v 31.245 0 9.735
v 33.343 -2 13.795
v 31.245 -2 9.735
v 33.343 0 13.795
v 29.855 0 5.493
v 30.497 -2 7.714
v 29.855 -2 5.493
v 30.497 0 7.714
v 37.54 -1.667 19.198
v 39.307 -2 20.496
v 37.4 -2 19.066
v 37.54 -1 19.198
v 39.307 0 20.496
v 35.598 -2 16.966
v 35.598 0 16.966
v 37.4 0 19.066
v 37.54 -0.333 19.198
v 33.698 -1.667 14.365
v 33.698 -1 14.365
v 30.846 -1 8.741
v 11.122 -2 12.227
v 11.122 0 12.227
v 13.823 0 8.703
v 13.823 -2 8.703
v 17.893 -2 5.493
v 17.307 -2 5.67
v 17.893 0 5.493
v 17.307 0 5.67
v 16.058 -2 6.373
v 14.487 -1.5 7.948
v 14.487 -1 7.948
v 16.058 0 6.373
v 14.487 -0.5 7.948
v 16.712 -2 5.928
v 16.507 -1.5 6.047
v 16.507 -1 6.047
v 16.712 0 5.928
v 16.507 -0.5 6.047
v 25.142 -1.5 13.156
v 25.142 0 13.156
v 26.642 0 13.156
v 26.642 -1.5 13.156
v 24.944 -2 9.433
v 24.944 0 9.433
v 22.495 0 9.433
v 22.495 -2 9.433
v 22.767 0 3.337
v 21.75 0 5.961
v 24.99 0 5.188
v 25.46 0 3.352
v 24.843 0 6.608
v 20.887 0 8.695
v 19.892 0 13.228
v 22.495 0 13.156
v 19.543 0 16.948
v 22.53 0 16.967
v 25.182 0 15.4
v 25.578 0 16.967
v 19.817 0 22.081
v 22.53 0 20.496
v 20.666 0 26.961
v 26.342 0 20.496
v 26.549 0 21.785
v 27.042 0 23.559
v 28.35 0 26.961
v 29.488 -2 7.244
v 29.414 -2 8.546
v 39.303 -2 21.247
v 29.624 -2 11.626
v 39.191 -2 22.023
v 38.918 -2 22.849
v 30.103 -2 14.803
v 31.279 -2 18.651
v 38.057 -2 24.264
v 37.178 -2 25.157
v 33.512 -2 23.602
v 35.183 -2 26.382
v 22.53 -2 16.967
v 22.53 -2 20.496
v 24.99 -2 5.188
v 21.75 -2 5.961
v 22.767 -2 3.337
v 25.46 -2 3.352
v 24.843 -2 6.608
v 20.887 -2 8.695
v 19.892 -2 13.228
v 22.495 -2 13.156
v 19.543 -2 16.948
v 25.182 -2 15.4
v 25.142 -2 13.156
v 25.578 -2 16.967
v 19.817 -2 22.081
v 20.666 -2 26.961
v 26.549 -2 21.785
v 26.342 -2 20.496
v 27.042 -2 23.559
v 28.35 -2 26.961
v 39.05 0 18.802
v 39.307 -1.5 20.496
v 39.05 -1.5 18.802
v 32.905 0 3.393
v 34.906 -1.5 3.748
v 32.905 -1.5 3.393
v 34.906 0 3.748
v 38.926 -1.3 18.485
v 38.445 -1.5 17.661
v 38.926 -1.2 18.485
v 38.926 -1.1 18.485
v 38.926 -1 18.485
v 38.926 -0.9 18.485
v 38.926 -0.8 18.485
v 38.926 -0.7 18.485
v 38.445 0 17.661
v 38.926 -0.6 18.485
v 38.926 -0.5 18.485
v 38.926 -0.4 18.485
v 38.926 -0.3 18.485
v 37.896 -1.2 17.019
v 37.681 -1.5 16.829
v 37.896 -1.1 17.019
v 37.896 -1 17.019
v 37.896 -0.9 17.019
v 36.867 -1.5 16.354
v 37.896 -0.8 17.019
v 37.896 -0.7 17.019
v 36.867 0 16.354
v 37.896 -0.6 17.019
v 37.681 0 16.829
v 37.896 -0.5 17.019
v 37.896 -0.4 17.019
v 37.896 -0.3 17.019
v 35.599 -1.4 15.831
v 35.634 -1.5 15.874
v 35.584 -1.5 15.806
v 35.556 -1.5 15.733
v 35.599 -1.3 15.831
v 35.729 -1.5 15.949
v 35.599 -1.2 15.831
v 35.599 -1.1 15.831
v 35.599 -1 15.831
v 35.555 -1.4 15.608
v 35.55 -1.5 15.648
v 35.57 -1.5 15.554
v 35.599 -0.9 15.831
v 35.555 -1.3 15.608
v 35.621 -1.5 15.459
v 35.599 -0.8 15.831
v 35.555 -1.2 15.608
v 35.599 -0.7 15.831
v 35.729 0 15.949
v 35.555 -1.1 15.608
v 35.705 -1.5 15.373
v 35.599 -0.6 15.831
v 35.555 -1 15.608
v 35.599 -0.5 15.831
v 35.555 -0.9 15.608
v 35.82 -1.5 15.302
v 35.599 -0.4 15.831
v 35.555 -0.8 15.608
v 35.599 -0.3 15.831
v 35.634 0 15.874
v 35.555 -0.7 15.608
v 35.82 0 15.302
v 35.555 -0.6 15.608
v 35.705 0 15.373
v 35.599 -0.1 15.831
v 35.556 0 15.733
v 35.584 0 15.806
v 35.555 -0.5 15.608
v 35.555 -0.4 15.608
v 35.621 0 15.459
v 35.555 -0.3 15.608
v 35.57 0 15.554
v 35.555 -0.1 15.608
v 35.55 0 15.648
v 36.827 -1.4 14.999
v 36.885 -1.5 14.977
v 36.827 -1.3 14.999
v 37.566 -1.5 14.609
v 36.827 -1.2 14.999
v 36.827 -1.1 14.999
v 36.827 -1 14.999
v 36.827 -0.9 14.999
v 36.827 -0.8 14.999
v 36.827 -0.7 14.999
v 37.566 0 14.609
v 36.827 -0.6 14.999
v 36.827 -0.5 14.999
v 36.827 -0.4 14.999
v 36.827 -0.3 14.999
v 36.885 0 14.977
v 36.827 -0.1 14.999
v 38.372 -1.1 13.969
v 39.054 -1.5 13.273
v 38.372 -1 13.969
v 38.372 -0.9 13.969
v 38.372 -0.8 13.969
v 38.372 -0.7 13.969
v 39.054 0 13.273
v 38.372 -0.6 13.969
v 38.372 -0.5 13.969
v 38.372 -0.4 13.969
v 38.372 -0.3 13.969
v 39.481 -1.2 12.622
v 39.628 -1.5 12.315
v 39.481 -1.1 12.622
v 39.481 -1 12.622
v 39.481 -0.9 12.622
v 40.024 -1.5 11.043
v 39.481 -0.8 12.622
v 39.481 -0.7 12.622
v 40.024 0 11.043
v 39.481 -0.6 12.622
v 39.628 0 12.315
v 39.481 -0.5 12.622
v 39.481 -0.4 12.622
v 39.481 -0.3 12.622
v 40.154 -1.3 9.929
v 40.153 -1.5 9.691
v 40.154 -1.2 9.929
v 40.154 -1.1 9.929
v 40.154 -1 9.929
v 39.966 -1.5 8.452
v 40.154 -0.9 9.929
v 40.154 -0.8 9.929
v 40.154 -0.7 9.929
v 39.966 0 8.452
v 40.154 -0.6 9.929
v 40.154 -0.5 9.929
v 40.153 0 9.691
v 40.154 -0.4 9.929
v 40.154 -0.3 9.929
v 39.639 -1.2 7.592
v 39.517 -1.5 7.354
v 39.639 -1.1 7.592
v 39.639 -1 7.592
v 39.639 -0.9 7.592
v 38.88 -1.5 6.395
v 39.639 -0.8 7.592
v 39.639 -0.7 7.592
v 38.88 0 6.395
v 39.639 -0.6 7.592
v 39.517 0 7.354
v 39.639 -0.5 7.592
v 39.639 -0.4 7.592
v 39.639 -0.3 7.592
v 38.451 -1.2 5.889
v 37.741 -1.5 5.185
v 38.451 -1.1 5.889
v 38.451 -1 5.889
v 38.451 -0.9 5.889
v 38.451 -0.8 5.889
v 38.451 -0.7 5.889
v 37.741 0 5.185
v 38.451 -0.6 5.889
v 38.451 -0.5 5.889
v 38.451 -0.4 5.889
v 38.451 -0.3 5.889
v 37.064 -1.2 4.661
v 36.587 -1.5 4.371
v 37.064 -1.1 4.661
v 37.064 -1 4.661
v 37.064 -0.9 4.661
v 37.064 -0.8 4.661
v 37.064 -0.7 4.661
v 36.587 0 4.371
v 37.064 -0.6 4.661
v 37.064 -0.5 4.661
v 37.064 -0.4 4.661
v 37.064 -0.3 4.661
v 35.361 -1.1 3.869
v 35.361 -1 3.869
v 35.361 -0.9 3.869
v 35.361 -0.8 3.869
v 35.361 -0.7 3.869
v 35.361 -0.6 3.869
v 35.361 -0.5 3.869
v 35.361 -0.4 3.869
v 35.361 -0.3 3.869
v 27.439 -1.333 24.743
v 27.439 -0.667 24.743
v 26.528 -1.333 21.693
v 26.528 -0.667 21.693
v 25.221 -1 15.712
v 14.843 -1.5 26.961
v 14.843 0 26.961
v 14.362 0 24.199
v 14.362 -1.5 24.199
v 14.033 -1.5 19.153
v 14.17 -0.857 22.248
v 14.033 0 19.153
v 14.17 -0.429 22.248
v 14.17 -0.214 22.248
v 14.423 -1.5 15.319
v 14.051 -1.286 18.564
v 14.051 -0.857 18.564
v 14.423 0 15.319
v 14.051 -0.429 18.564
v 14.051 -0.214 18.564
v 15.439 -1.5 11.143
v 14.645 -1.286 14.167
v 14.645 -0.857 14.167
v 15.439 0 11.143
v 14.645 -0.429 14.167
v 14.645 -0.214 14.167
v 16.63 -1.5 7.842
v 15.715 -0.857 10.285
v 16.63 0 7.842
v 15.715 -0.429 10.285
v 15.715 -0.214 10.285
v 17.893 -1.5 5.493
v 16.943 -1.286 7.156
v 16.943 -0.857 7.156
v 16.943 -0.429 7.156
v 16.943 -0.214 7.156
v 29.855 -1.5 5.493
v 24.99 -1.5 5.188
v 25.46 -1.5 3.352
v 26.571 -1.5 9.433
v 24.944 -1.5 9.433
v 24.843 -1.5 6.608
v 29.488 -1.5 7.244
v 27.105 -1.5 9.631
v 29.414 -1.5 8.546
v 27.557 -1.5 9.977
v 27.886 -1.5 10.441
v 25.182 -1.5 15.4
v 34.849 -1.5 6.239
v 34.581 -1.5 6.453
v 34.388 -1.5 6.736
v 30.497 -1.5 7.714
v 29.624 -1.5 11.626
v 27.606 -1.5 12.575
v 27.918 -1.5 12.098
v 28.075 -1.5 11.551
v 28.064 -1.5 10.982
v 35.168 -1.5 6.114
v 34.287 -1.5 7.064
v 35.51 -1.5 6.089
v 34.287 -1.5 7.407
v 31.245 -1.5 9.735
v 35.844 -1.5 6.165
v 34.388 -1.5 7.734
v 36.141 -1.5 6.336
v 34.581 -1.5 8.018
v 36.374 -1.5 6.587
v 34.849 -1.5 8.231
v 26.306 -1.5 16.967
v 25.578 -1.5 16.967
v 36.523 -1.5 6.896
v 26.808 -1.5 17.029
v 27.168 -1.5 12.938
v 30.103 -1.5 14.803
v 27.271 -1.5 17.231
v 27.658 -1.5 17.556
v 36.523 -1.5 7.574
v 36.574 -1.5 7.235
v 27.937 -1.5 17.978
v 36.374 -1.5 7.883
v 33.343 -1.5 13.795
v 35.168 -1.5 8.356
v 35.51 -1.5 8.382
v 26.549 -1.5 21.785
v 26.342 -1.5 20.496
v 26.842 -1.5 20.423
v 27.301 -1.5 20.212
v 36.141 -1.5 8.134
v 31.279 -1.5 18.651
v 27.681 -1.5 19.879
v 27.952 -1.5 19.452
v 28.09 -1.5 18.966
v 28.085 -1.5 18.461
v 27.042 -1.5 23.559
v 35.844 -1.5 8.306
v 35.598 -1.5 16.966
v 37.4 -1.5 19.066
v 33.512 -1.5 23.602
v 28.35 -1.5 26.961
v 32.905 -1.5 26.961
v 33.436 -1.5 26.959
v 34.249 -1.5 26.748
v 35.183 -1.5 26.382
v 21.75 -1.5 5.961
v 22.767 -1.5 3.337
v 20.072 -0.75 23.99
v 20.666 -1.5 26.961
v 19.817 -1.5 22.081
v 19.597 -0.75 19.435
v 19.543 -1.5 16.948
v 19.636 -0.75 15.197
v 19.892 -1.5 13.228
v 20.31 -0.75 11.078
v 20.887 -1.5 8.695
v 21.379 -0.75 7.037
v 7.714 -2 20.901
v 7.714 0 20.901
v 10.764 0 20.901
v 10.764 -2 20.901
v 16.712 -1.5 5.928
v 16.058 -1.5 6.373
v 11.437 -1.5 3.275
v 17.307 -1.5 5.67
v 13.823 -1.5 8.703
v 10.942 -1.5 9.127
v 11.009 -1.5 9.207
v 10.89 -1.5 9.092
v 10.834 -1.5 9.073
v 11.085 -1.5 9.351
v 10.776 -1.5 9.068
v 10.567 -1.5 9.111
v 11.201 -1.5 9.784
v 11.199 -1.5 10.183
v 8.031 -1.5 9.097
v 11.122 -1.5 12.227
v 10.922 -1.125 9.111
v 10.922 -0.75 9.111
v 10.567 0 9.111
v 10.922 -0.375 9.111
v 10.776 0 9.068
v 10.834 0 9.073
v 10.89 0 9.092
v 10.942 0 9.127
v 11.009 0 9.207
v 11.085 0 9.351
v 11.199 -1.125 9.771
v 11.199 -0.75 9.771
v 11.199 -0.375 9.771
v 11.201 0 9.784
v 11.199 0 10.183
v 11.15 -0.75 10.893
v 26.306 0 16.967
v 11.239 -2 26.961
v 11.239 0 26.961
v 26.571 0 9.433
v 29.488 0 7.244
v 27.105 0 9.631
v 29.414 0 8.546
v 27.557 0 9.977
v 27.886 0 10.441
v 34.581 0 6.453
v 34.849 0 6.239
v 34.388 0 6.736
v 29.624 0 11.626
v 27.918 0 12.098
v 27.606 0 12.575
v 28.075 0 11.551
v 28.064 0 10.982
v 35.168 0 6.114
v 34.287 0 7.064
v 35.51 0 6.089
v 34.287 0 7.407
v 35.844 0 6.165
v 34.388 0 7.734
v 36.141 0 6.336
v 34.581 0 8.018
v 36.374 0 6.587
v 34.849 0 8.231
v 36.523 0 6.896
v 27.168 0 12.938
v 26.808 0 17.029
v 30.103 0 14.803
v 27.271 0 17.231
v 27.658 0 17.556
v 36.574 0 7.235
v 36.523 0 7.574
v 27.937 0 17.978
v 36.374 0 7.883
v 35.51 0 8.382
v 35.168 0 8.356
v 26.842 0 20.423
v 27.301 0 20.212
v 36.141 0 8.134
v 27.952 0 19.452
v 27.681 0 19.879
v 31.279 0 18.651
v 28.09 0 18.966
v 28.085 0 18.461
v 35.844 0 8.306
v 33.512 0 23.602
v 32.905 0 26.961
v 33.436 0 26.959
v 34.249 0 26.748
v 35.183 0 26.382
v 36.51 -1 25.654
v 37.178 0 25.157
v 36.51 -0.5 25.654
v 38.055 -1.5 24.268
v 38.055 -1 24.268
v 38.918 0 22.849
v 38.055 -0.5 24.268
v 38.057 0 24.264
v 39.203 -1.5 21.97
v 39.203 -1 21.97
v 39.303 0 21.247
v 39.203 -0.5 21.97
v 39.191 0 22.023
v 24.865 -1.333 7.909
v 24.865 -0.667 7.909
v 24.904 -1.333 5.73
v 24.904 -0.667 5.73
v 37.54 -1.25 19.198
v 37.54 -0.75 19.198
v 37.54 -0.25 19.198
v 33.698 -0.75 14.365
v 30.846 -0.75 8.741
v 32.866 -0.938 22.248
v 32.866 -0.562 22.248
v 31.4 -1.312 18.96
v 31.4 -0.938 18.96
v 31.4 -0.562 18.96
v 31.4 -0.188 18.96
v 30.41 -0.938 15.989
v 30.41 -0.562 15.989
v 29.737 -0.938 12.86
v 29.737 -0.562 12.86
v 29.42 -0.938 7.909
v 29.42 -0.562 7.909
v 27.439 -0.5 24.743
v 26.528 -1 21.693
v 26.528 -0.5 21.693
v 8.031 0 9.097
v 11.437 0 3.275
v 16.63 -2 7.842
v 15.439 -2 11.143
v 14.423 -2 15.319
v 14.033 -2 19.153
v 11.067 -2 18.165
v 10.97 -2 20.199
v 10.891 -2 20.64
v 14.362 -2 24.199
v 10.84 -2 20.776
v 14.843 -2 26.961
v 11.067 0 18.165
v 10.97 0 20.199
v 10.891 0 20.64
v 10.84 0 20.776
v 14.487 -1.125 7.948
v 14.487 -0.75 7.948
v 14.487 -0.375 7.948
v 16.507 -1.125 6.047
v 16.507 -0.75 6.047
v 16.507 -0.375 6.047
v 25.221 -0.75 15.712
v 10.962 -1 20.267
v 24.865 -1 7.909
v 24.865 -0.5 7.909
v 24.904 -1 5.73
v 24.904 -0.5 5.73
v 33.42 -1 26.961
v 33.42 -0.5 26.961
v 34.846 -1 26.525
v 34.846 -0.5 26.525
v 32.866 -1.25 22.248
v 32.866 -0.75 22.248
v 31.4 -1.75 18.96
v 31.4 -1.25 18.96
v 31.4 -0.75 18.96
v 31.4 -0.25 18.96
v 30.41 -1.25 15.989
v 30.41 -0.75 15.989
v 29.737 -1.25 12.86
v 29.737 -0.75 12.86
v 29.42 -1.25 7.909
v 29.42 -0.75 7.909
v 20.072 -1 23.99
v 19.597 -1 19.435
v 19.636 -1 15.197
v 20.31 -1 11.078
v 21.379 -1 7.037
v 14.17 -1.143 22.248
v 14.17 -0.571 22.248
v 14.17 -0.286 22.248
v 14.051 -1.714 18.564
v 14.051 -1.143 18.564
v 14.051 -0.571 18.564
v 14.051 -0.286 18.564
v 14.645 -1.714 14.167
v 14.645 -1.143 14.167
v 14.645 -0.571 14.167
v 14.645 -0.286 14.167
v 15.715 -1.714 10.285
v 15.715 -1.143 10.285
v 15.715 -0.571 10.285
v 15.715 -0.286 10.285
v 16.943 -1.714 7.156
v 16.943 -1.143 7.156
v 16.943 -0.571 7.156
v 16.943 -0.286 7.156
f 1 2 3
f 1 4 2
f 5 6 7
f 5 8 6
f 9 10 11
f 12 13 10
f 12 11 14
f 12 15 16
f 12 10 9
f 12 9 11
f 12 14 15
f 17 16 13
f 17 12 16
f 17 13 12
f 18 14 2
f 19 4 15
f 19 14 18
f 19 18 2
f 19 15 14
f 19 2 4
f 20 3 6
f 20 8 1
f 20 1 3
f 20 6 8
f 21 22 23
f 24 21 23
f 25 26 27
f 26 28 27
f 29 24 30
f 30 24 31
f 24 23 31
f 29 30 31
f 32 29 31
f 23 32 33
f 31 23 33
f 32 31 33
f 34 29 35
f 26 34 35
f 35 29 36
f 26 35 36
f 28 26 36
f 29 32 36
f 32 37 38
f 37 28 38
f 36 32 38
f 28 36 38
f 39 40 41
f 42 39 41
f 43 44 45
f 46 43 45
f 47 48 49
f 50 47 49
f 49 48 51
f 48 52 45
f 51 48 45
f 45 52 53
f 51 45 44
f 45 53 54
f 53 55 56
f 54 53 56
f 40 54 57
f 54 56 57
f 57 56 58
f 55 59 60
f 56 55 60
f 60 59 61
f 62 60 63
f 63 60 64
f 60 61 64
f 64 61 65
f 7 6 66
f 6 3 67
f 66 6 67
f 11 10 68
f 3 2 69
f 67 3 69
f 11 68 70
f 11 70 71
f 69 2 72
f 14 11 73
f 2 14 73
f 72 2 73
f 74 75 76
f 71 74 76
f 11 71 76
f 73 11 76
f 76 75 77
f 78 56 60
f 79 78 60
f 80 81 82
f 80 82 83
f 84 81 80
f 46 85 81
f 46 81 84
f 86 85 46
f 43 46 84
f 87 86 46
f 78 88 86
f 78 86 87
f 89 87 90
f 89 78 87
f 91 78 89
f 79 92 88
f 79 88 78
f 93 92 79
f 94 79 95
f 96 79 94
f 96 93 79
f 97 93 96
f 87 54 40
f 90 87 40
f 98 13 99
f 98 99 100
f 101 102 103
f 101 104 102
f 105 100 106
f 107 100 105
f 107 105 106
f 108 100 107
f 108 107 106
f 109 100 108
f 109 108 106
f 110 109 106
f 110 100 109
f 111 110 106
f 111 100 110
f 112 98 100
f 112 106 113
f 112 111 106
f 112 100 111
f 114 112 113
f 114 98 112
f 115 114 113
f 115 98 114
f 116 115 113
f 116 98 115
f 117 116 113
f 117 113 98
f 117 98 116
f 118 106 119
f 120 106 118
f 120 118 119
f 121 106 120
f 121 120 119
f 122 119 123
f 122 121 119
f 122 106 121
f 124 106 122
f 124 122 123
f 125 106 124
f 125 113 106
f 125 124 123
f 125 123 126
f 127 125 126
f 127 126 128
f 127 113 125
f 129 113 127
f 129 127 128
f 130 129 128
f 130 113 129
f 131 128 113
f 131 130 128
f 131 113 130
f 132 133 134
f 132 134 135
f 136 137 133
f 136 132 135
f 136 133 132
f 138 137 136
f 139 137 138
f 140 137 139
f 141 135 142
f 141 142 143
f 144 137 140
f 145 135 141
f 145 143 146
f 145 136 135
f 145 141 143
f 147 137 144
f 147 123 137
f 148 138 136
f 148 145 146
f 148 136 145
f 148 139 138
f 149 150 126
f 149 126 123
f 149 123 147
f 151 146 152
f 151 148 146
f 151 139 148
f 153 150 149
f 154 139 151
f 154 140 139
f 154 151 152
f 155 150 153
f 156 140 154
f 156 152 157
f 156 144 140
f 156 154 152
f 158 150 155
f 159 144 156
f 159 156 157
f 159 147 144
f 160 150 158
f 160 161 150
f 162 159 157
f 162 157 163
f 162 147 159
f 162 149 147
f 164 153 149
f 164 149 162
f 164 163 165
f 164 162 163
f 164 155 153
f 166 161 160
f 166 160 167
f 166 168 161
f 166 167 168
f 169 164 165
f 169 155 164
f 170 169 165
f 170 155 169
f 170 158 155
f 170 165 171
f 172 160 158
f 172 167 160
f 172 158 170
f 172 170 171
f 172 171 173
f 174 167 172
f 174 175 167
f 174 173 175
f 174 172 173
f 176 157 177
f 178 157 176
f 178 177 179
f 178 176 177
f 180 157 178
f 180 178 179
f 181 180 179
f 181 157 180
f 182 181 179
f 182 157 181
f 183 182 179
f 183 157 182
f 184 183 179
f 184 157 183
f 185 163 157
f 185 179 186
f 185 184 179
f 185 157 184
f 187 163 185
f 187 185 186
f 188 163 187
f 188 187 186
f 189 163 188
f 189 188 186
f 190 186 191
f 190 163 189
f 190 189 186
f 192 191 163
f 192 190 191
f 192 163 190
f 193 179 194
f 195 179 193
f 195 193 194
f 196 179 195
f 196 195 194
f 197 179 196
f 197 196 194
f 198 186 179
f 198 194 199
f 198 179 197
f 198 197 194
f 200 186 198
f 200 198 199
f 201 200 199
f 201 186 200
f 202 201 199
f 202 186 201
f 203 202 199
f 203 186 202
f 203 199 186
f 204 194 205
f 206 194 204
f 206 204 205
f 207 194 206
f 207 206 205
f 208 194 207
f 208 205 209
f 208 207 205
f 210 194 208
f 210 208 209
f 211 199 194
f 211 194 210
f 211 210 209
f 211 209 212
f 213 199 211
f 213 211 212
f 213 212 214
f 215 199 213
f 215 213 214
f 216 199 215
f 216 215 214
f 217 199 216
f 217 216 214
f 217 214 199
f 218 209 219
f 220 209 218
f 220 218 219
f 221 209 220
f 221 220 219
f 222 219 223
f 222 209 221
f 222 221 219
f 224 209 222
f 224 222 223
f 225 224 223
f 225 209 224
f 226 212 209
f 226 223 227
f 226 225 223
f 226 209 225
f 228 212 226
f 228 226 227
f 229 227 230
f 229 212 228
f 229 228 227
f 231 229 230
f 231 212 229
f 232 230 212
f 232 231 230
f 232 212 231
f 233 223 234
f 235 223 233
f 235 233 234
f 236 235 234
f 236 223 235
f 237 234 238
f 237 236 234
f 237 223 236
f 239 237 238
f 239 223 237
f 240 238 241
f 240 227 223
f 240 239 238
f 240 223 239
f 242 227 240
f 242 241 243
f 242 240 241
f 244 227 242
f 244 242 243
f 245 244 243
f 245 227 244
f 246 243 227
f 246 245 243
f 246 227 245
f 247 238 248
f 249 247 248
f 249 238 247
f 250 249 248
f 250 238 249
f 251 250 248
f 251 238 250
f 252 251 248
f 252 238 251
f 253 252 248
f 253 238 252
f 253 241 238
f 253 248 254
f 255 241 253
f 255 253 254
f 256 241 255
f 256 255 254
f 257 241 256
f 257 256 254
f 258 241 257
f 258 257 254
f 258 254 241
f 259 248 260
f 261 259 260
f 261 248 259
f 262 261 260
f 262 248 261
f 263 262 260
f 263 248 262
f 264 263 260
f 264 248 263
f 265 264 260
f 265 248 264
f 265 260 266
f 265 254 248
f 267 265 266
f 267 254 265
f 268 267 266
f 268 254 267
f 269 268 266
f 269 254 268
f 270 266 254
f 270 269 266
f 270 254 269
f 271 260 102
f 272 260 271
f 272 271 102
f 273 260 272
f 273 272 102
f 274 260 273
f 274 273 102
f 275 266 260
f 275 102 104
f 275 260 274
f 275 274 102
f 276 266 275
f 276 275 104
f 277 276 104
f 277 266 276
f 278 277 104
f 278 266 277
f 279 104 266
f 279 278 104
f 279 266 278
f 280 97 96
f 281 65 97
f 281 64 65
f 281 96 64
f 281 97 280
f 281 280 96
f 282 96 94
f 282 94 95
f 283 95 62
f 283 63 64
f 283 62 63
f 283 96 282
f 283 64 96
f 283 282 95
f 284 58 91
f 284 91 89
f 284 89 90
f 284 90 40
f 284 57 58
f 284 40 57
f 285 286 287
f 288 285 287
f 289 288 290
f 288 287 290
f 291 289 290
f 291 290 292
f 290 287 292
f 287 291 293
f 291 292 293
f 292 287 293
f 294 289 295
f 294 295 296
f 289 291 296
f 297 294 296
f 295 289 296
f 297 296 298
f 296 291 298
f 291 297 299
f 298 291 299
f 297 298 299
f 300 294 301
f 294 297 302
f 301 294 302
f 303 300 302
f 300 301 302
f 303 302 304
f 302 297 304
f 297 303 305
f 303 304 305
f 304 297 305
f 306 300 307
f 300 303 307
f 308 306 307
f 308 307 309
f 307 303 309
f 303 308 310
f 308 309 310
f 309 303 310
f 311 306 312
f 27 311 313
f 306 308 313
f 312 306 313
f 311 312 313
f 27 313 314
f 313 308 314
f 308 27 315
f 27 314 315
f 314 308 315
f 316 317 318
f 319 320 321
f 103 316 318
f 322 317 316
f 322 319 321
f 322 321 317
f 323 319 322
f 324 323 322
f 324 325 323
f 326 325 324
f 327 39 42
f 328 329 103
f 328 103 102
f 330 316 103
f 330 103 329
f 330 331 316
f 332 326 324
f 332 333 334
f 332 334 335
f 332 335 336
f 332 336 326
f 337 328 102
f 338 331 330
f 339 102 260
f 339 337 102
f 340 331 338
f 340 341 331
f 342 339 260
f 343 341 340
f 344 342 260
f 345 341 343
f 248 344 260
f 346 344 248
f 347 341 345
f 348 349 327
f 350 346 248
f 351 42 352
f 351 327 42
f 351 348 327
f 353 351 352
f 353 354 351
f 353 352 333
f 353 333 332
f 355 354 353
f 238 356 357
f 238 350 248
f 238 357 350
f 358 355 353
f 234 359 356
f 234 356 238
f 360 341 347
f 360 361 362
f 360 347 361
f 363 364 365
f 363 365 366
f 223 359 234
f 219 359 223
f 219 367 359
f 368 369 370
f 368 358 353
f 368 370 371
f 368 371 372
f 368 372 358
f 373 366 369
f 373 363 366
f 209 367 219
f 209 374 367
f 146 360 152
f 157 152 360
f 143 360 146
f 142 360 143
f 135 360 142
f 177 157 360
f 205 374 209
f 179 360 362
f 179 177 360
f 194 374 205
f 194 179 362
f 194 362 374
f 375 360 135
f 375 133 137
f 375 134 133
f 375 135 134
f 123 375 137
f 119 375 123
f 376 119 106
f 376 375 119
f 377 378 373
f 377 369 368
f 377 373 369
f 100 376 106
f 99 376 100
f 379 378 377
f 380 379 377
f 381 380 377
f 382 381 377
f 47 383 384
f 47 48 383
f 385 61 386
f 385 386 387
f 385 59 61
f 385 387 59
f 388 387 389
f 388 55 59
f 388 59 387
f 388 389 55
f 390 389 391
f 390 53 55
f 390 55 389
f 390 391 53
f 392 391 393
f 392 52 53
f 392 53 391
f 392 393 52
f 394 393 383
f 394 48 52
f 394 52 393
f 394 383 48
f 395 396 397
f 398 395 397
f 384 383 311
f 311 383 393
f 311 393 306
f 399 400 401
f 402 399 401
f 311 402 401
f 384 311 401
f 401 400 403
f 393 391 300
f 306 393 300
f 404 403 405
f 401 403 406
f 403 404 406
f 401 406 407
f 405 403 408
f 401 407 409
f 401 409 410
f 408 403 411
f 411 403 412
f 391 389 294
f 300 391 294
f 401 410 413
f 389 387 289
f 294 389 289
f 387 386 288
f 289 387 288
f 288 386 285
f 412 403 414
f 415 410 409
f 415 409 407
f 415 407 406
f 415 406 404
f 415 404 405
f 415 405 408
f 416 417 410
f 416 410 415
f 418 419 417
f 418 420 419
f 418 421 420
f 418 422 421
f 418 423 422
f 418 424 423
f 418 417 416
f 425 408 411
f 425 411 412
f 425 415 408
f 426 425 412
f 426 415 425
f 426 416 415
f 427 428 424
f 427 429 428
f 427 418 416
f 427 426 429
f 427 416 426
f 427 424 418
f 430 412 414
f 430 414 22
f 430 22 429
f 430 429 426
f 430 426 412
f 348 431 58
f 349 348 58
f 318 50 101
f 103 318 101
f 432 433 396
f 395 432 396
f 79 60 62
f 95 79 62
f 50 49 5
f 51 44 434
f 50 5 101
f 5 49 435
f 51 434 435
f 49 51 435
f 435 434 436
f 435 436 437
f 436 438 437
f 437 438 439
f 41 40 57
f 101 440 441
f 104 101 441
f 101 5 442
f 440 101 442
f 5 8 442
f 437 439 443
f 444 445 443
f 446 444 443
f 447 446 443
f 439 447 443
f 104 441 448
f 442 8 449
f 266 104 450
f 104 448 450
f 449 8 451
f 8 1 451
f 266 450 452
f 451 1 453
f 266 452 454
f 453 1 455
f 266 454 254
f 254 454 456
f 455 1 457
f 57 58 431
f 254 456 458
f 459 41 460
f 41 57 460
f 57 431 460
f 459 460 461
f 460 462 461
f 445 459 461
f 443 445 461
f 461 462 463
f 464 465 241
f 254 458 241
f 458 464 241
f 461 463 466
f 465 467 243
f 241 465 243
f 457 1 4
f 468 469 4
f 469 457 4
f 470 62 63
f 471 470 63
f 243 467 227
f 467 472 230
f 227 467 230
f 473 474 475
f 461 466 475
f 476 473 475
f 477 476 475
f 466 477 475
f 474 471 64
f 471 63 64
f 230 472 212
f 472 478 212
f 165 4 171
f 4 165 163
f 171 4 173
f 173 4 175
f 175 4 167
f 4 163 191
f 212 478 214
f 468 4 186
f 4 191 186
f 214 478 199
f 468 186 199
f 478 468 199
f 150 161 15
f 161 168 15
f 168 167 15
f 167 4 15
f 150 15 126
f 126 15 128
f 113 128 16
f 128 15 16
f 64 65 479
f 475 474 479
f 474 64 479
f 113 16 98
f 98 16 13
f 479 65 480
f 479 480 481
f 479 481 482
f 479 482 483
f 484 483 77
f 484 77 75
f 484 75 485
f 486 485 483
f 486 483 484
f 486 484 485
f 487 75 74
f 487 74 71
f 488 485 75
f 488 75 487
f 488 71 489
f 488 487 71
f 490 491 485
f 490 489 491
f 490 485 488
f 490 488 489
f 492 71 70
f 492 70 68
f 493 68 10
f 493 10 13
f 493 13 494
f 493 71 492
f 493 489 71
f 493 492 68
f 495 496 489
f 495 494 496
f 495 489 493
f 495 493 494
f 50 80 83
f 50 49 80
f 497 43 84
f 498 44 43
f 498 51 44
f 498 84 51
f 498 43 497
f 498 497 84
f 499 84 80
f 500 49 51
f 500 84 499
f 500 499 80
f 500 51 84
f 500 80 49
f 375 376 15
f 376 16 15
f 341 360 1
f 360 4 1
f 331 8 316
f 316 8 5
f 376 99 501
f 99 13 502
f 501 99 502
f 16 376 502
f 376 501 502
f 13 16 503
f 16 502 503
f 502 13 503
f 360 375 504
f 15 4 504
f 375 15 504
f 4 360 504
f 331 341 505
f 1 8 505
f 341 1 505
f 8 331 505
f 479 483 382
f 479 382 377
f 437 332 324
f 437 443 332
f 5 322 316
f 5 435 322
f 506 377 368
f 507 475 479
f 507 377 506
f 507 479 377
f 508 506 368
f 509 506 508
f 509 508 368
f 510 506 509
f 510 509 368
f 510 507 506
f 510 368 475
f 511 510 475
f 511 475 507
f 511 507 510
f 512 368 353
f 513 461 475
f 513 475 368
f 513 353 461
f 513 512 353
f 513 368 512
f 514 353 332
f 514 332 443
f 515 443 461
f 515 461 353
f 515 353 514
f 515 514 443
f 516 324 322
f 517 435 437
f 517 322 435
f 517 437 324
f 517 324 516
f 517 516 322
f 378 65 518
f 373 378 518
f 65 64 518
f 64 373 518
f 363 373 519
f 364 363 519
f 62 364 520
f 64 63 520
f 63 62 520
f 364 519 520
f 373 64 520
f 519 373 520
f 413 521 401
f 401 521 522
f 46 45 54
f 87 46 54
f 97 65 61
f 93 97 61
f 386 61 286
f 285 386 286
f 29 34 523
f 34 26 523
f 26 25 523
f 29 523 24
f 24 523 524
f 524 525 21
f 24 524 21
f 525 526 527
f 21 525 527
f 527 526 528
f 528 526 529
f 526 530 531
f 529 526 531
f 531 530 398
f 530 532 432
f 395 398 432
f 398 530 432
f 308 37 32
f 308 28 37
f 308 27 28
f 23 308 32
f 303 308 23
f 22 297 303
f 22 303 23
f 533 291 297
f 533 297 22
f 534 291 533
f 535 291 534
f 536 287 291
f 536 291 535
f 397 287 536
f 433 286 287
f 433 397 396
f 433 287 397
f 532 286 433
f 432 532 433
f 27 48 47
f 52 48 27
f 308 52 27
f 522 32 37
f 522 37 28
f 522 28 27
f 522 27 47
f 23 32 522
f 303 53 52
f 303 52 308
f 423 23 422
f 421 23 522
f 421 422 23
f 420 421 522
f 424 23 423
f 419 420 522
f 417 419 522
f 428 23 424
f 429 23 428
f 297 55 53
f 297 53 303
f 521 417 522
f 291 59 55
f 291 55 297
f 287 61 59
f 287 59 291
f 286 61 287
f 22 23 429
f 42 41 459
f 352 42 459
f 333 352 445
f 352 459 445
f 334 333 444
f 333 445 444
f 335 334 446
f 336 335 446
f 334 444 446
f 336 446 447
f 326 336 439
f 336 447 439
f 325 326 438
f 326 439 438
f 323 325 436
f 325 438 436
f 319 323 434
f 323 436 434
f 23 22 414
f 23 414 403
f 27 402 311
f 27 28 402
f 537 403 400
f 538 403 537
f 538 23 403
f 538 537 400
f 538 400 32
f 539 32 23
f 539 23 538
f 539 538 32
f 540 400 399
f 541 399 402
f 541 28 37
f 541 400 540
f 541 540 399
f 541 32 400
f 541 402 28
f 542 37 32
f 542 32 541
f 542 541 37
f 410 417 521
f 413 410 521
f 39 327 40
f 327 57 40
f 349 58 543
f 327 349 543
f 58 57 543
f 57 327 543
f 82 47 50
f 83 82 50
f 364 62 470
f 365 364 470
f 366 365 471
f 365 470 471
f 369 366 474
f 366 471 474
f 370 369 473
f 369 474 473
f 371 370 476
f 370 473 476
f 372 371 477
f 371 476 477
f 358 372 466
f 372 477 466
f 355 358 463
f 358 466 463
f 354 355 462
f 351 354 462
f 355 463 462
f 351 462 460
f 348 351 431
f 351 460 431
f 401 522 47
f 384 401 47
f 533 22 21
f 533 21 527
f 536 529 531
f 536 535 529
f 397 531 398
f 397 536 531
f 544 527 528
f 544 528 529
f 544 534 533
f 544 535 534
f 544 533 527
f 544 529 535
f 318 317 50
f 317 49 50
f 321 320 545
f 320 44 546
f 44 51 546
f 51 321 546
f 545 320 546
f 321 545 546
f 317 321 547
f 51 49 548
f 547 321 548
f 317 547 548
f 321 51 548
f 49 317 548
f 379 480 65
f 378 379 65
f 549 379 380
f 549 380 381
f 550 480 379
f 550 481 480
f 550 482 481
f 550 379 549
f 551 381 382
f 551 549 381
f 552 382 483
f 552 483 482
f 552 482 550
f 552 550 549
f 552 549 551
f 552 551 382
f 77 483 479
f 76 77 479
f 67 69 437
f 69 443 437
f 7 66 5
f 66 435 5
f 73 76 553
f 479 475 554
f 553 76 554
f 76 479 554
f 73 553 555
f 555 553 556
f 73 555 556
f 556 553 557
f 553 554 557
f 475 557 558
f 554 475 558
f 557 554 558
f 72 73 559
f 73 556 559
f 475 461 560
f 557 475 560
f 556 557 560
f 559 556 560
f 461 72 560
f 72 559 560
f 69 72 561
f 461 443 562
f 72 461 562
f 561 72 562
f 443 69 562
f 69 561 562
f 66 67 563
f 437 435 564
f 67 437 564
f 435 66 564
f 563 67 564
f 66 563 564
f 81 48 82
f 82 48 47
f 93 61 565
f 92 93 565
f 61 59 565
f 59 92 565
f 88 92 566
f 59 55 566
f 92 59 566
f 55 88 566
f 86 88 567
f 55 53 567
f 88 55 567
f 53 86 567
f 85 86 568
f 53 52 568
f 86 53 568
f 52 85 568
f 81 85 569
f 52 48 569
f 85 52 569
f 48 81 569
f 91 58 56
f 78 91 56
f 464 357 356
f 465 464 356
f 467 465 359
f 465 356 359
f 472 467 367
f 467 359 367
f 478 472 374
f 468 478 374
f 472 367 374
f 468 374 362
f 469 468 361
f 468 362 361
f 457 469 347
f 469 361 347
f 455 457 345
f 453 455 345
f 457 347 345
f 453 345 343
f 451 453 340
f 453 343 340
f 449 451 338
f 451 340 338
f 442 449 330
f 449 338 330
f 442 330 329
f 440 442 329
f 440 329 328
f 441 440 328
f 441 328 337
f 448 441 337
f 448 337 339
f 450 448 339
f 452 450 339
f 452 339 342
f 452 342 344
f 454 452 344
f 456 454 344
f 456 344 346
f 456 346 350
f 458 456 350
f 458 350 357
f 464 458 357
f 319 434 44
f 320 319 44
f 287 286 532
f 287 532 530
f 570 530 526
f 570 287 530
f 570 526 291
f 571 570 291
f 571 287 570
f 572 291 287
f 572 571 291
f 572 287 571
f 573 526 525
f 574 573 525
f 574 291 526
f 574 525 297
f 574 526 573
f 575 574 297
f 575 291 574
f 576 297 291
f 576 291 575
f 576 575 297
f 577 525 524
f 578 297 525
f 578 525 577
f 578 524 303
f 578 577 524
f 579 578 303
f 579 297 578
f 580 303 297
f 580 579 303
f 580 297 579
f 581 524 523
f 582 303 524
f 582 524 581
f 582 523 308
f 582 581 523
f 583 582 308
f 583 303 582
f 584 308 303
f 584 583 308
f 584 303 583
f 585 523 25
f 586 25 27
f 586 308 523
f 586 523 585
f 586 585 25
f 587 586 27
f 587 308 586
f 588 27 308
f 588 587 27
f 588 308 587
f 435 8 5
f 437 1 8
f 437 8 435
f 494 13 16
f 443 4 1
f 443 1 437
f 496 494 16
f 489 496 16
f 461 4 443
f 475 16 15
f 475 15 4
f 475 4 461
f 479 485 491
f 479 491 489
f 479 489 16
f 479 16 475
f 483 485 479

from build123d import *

# Parameters (mm, degrees)
F1_DEPTH = 1.5
F2_DEPTH = 2
F3_R     = 1.15
F4_DEPTH = 25


with BuildPart() as f1:
    # F0 (on Front) → F1 (new body)
    with BuildSketch(Plane.XZ):
        with BuildLine():
            add(Edge.make_bspline(
                [(20.6660386175, 26.9610639662), (20.4576856509, 26.0324368396), (19.9931584423, 23.9620436311), (19.5173953893, 19.3870598202), (19.5078143453, 15.2132446042), (20.2621023743, 11.0693133562), (21.2909258667, 7.0174099957), (22.2792745883, 4.5524684686), (22.7665334657, 3.3372449192)],
                knots=[0, 0, 0, 0, 0.144869677, 0.3229899136, 0.4943422483, 0.6643889527, 0.8345427493, 1, 1, 1, 1], degree=3))
            Line((20.6660386175, 26.9610639662), (14.8434303701, 26.9610639662))
            add(Edge.make_bspline(
                [(14.8434303701, 26.9610639662), (14.7344330597, 26.4948199573), (14.4704403158, 25.3655715864), (14.1366032002, 22.1260809688), (13.910603749, 18.5601021745), (14.5550095001, 14.1289323907), (15.6296335083, 10.3758735811), (16.8423833401, 7.1724763104), (17.5772372142, 5.9979488297), (17.8933683783, 5.4926718585)],
                knots=[0, 0, 0, 0, 0.1021624491, 0.247438631, 0.4036233083, 0.5749836352, 0.7382288881, 0.8873871266, 1, 1, 1, 1], degree=3))
            add(Edge.make_bspline(
                [(11.1215539734, 12.2272790058), (11.5249575236, 11.6395620371), (12.412453889, 10.3496180148), (14.431098963, 7.968574755), (16.3627124278, 5.9209986296), (17.4382411729, 5.6200255878), (17.8933683783, 5.4926718585)],
                knots=[0, 0, 0, 0, 0.242492789, 0.5324088513, 0.8021237637, 1, 1, 1, 1], degree=3))
            add(Edge.make_bspline(
                [(10.5670526858, 9.1111835735), (10.6931901201, 9.0740202497), (10.9983639943, 8.9841081981), (11.2781543186, 9.919520696), (11.157785675, 10.2170936868), (11.1291386465, 11.5786221116), (11.1215539734, 12.2272790058)],
                knots=[0, 0, 0, 0, 0.0944625155, 0.2285403376, 0.3799300941, 0.4796146215, 0.4796146215, 0.4796146215, 0.4796146215], degree=3))
            Line((10.5670526858, 9.1111835735), (8.0305831507, 9.0971440077))
            Line((8.0305831507, 9.0971440077), (11.4370062947, 3.2745350618))
            Line((11.4370062947, 3.2745350618), (22.7665334657, 3.3372449192))
        make_face()
    extrude(amount=F1_DEPTH)


with BuildPart() as f1b:
    # F0 (on Front) → F1, piece 2 (new body)
    with BuildSketch(Plane.XZ):
        with BuildLine():
            add(Edge.make_bspline(
                [(28.3502973616, 26.9610639662), (28.0502551274, 26.2830481717), (27.4045214551, 24.8238615013), (26.478371341, 21.7483968495), (26.3793669662, 20.8416248794), (26.3415891673, 20.4956214875)],
                knots=[0, 0, 0, 0, 0.3492798891, 0.7517001264, 1, 1, 1, 1], degree=3))
            ThreePointArc((26.3415891673, 20.4956214875), (28.1060838339, 18.7133938116), (26.3063013549, 16.9668085873))
            Line((26.3063013549, 16.9668085873), (25.577627122, 16.9668085873))
            add(Edge.make_bspline(
                [(25.577627122, 16.9668085873), (25.4379730337, 16.588157163), (25.1027792876, 15.6793288483), (25.1274998378, 14.0854824684), (25.1419208944, 13.1556913257)],
                knots=[0, 0, 0, 0, 0.4166369141, 1, 1, 1, 1], degree=3))
            Line((25.1419208944, 13.1556913257), (26.6415383667, 13.1556913257))
            ThreePointArc((26.6415383667, 13.1556913257), (28.0911678774, 11.266093081), (26.570962742, 9.4327945262))
            Line((26.570962742, 9.4327945262), (24.9438732862, 9.4327945262))
            add(Edge.make_bspline(
                [(24.9438732862, 9.4327945262), (24.9163529568, 8.9480237368), (24.8559478929, 7.8839881296), (24.7861131689, 5.6779053674), (25.2312208373, 4.14200634), (25.4601221254, 3.3521541522)],
                knots=[0, 0, 0, 0, 0.2890163132, 0.6343691802, 1, 1, 1, 1], degree=3))
            Line((25.4601221254, 3.3521541522), (32.9053997993, 3.3933643717))
            add(Edge.make_bspline(
                [(39.3074102919, 20.4956214875), (39.2951179166, 20.2298391722), (39.2179207498, 19.4479095816), (39.0347112987, 18.4764256834), (37.9649892722, 16.9055315742), (36.7511969896, 16.2266947713), (35.447641843, 15.9877866604), (35.6092749957, 15.2132865459), (36.9602853616, 15.1302585806), (38.4312837701, 13.9685881697), (39.6437777031, 12.7177203077), (40.3882705232, 9.9027454506), (39.7848092027, 7.5532015194), (38.5038444292, 5.8585270129), (37.1089367796, 4.5788545157), (35.3631722184, 3.7588948786), (33.7627880829, 3.5208788525), (32.9053997993, 3.3933643717)],
                knots=[0.2806495168, 0.2806495168, 0.2806495168, 0.2806495168, 0.3014569879, 0.3453971681, 0.396846309, 0.4435194229, 0.4841702474, 0.5097520803, 0.5521263511, 0.6045059572, 0.6552815621, 0.7193348379, 0.7788020968, 0.8342006587, 0.8865145622, 0.9392014189, 1, 1, 1, 1], degree=3))
            add(Edge.make_bspline(
                [(39.3074102919, 20.4956214875), (38.7114864845, 20.1113585687), (37.4236004088, 19.2809053184), (35.5597699096, 16.9257937336), (33.6295365482, 14.4334626917), (32.0063954632, 11.3948808305), (30.7630387226, 8.7746419521), (30.1657042198, 6.6145672452), (29.8554617912, 5.4926718585)],
                knots=[0, 0, 0, 0, 0.1425500914, 0.3080734074, 0.4808644374, 0.6584821849, 0.8226231435, 1, 1, 1, 1], degree=3))
            add(Edge.make_bspline(
                [(35.1827172278, 26.3815832659), (34.814374166, 25.8500031522), (34.0128628658, 24.6904209121), (32.849935442, 22.2143984263), (31.3256658929, 18.9647087573), (30.3811686552, 16.040891122), (29.6328212541, 12.8931358044), (29.588632846, 10.2289829689), (29.2730146106, 7.9026581045), (29.6592567007, 6.3045083419), (29.8554617912, 5.4926718585)],
                knots=[0, 0, 0, 0, 0.1068126147, 0.2319426002, 0.3752130849, 0.5088443981, 0.6439478253, 0.767138686, 0.881674737, 1, 1, 1, 1], degree=3))
            add(Edge.make_bspline(
                [(32.9053997993, 26.9610639662), (33.05625291, 26.9755248546), (33.4638054683, 27.014593138), (34.4449882919, 26.6989109985), (35.071676978, 26.4313536304), (35.1827172278, 26.3815832659)],
                knots=[0, 0, 0, 0, 0.0275852161, 0.074525645, 0.08475593, 0.08475593, 0.08475593, 0.08475593], degree=3))
            Line((32.9053997993, 26.9610639662), (28.3502973616, 26.9610639662))
        make_face()
    extrude(amount=F1_DEPTH)

    # F3 (on face) → F4 (cut)
    with BuildSketch(Plane.XZ.offset(1.5)):
        with Locations((35.423822701, 7.2353151627)):
            Circle(F3_R)
    extrude(amount=-F4_DEPTH, mode=Mode.SUBTRACT)


with BuildPart() as f2:
    # F0 (on Front) → F2 (new body)
    with BuildSketch(Plane.XZ):
        with BuildLine():
            add(Edge.make_bspline(
                [(14.8434303701, 26.9610639662), (14.7344330597, 26.4948199573), (14.4704403158, 25.3655715864), (14.1366032002, 22.1260809688), (13.910603749, 18.5601021745), (14.5550095001, 14.1289323907), (15.6296335083, 10.3758735811), (16.8423833401, 7.1724763104), (17.5772372142, 5.9979488297), (17.8933683783, 5.4926718585)],
                knots=[0, 0, 0, 0, 0.1021624491, 0.247438631, 0.4036233083, 0.5749836352, 0.7382288881, 0.8873871266, 1, 1, 1, 1], degree=3))
            Line((14.8434303701, 26.9610639662), (11.2389586866, 26.9610639662))
            Line((11.2389586866, 26.9610639662), (7.7137062326, 20.9007989615))
            Line((7.7137062326, 20.9007989615), (10.7636433095, 20.9007989615))
            add(Edge.make_bspline(
                [(11.1215539734, 12.2272790058), (11.09178863, 14.772872571), (11.1298205182, 20.3734036888), (10.8364667323, 20.7959133268), (10.7636433095, 20.9007989615)],
                knots=[0.4796146215, 0.4796146215, 0.4796146215, 0.4796146215, 0.8708172647, 1, 1, 1, 1], degree=3))
            add(Edge.make_bspline(
                [(11.1215539734, 12.2272790058), (11.5249575236, 11.6395620371), (12.412453889, 10.3496180148), (14.431098963, 7.968574755), (16.3627124278, 5.9209986296), (17.4382411729, 5.6200255878), (17.8933683783, 5.4926718585)],
                knots=[0, 0, 0, 0, 0.242492789, 0.5324088513, 0.8021237637, 1, 1, 1, 1], degree=3))
        make_face()
    extrude(amount=F2_DEPTH)


with BuildPart() as f2b:
    # F0 (on Front) → F2, piece 2 (new body)
    with BuildSketch(Plane.XZ):
        with BuildLine():
            Line((22.5304719056, 16.9668085873), (22.5304719056, 20.4956214875))
            Line((22.5304719056, 20.4956214875), (26.3415891673, 20.4956214875))
            add(Edge.make_bspline(
                [(28.3502973616, 26.9610639662), (28.0502551274, 26.2830481717), (27.4045214551, 24.8238615013), (26.478371341, 21.7483968495), (26.3793669662, 20.8416248794), (26.3415891673, 20.4956214875)],
                knots=[0, 0, 0, 0, 0.3492798891, 0.7517001264, 1, 1, 1, 1], degree=3))
            Line((28.3502973616, 26.9610639662), (20.6660386175, 26.9610639662))
            add(Edge.make_bspline(
                [(20.6660386175, 26.9610639662), (20.4576856509, 26.0324368396), (19.9931584423, 23.9620436311), (19.5173953893, 19.3870598202), (19.5078143453, 15.2132446042), (20.2621023743, 11.0693133562), (21.2909258667, 7.0174099957), (22.2792745883, 4.5524684686), (22.7665334657, 3.3372449192)],
                knots=[0, 0, 0, 0, 0.144869677, 0.3229899136, 0.4943422483, 0.6643889527, 0.8345427493, 1, 1, 1, 1], degree=3))
            Line((22.7665334657, 3.3372449192), (25.4601221254, 3.3521541522))
            add(Edge.make_bspline(
                [(24.9438732862, 9.4327945262), (24.9163529568, 8.9480237368), (24.8559478929, 7.8839881296), (24.7861131689, 5.6779053674), (25.2312208373, 4.14200634), (25.4601221254, 3.3521541522)],
                knots=[0, 0, 0, 0, 0.2890163132, 0.6343691802, 1, 1, 1, 1], degree=3))
            Line((24.9438732862, 9.4327945262), (22.4951840937, 9.4327945262))
            Line((22.4951840937, 9.4327945262), (22.4951840937, 13.1556913257))
            Line((22.4951840937, 13.1556913257), (25.1419208944, 13.1556913257))
            add(Edge.make_bspline(
                [(25.577627122, 16.9668085873), (25.4379730337, 16.588157163), (25.1027792876, 15.6793288483), (25.1274998378, 14.0854824684), (25.1419208944, 13.1556913257)],
                knots=[0, 0, 0, 0, 0.4166369141, 1, 1, 1, 1], degree=3))
            Line((25.577627122, 16.9668085873), (22.5304719056, 16.9668085873))
        make_face()
    extrude(amount=F2_DEPTH)


with BuildPart() as f2c:
    # F0 (on Front) → F2, piece 3 (new body)
    with BuildSketch(Plane.XZ):
        with BuildLine():
            add(Edge.make_bspline(
                [(35.1827172278, 26.3815832659), (35.6434801218, 26.1750605208), (36.6616822988, 25.6239816404), (38.1720693205, 24.354692801), (39.2835474939, 22.3334695919), (39.3289438558, 20.9612142086), (39.3074102919, 20.4956214875)],
                knots=[0.08475593, 0.08475593, 0.08475593, 0.08475593, 0.1272066245, 0.182590053, 0.2441993598, 0.2806495168, 0.2806495168, 0.2806495168, 0.2806495168], degree=3))
            add(Edge.make_bspline(
                [(35.1827172278, 26.3815832659), (34.814374166, 25.8500031522), (34.0128628658, 24.6904209121), (32.849935442, 22.2143984263), (31.3256658929, 18.9647087573), (30.3811686552, 16.040891122), (29.6328212541, 12.8931358044), (29.588632846, 10.2289829689), (29.2730146106, 7.9026581045), (29.6592567007, 6.3045083419), (29.8554617912, 5.4926718585)],
                knots=[0, 0, 0, 0, 0.1068126147, 0.2319426002, 0.3752130849, 0.5088443981, 0.6439478253, 0.767138686, 0.881674737, 1, 1, 1, 1], degree=3))
            add(Edge.make_bspline(
                [(39.3074102919, 20.4956214875), (38.7114864845, 20.1113585687), (37.4236004088, 19.2809053184), (35.5597699096, 16.9257937336), (33.6295365482, 14.4334626917), (32.0063954632, 11.3948808305), (30.7630387226, 8.7746419521), (30.1657042198, 6.6145672452), (29.8554617912, 5.4926718585)],
                knots=[0, 0, 0, 0, 0.1425500914, 0.3080734074, 0.4808644374, 0.6584821849, 0.8226231435, 1, 1, 1, 1], degree=3))
        make_face()
    extrude(amount=F2_DEPTH)


solid = Compound([f1.part, f1b.part, f2.part, f2b.part, f2c.part])
